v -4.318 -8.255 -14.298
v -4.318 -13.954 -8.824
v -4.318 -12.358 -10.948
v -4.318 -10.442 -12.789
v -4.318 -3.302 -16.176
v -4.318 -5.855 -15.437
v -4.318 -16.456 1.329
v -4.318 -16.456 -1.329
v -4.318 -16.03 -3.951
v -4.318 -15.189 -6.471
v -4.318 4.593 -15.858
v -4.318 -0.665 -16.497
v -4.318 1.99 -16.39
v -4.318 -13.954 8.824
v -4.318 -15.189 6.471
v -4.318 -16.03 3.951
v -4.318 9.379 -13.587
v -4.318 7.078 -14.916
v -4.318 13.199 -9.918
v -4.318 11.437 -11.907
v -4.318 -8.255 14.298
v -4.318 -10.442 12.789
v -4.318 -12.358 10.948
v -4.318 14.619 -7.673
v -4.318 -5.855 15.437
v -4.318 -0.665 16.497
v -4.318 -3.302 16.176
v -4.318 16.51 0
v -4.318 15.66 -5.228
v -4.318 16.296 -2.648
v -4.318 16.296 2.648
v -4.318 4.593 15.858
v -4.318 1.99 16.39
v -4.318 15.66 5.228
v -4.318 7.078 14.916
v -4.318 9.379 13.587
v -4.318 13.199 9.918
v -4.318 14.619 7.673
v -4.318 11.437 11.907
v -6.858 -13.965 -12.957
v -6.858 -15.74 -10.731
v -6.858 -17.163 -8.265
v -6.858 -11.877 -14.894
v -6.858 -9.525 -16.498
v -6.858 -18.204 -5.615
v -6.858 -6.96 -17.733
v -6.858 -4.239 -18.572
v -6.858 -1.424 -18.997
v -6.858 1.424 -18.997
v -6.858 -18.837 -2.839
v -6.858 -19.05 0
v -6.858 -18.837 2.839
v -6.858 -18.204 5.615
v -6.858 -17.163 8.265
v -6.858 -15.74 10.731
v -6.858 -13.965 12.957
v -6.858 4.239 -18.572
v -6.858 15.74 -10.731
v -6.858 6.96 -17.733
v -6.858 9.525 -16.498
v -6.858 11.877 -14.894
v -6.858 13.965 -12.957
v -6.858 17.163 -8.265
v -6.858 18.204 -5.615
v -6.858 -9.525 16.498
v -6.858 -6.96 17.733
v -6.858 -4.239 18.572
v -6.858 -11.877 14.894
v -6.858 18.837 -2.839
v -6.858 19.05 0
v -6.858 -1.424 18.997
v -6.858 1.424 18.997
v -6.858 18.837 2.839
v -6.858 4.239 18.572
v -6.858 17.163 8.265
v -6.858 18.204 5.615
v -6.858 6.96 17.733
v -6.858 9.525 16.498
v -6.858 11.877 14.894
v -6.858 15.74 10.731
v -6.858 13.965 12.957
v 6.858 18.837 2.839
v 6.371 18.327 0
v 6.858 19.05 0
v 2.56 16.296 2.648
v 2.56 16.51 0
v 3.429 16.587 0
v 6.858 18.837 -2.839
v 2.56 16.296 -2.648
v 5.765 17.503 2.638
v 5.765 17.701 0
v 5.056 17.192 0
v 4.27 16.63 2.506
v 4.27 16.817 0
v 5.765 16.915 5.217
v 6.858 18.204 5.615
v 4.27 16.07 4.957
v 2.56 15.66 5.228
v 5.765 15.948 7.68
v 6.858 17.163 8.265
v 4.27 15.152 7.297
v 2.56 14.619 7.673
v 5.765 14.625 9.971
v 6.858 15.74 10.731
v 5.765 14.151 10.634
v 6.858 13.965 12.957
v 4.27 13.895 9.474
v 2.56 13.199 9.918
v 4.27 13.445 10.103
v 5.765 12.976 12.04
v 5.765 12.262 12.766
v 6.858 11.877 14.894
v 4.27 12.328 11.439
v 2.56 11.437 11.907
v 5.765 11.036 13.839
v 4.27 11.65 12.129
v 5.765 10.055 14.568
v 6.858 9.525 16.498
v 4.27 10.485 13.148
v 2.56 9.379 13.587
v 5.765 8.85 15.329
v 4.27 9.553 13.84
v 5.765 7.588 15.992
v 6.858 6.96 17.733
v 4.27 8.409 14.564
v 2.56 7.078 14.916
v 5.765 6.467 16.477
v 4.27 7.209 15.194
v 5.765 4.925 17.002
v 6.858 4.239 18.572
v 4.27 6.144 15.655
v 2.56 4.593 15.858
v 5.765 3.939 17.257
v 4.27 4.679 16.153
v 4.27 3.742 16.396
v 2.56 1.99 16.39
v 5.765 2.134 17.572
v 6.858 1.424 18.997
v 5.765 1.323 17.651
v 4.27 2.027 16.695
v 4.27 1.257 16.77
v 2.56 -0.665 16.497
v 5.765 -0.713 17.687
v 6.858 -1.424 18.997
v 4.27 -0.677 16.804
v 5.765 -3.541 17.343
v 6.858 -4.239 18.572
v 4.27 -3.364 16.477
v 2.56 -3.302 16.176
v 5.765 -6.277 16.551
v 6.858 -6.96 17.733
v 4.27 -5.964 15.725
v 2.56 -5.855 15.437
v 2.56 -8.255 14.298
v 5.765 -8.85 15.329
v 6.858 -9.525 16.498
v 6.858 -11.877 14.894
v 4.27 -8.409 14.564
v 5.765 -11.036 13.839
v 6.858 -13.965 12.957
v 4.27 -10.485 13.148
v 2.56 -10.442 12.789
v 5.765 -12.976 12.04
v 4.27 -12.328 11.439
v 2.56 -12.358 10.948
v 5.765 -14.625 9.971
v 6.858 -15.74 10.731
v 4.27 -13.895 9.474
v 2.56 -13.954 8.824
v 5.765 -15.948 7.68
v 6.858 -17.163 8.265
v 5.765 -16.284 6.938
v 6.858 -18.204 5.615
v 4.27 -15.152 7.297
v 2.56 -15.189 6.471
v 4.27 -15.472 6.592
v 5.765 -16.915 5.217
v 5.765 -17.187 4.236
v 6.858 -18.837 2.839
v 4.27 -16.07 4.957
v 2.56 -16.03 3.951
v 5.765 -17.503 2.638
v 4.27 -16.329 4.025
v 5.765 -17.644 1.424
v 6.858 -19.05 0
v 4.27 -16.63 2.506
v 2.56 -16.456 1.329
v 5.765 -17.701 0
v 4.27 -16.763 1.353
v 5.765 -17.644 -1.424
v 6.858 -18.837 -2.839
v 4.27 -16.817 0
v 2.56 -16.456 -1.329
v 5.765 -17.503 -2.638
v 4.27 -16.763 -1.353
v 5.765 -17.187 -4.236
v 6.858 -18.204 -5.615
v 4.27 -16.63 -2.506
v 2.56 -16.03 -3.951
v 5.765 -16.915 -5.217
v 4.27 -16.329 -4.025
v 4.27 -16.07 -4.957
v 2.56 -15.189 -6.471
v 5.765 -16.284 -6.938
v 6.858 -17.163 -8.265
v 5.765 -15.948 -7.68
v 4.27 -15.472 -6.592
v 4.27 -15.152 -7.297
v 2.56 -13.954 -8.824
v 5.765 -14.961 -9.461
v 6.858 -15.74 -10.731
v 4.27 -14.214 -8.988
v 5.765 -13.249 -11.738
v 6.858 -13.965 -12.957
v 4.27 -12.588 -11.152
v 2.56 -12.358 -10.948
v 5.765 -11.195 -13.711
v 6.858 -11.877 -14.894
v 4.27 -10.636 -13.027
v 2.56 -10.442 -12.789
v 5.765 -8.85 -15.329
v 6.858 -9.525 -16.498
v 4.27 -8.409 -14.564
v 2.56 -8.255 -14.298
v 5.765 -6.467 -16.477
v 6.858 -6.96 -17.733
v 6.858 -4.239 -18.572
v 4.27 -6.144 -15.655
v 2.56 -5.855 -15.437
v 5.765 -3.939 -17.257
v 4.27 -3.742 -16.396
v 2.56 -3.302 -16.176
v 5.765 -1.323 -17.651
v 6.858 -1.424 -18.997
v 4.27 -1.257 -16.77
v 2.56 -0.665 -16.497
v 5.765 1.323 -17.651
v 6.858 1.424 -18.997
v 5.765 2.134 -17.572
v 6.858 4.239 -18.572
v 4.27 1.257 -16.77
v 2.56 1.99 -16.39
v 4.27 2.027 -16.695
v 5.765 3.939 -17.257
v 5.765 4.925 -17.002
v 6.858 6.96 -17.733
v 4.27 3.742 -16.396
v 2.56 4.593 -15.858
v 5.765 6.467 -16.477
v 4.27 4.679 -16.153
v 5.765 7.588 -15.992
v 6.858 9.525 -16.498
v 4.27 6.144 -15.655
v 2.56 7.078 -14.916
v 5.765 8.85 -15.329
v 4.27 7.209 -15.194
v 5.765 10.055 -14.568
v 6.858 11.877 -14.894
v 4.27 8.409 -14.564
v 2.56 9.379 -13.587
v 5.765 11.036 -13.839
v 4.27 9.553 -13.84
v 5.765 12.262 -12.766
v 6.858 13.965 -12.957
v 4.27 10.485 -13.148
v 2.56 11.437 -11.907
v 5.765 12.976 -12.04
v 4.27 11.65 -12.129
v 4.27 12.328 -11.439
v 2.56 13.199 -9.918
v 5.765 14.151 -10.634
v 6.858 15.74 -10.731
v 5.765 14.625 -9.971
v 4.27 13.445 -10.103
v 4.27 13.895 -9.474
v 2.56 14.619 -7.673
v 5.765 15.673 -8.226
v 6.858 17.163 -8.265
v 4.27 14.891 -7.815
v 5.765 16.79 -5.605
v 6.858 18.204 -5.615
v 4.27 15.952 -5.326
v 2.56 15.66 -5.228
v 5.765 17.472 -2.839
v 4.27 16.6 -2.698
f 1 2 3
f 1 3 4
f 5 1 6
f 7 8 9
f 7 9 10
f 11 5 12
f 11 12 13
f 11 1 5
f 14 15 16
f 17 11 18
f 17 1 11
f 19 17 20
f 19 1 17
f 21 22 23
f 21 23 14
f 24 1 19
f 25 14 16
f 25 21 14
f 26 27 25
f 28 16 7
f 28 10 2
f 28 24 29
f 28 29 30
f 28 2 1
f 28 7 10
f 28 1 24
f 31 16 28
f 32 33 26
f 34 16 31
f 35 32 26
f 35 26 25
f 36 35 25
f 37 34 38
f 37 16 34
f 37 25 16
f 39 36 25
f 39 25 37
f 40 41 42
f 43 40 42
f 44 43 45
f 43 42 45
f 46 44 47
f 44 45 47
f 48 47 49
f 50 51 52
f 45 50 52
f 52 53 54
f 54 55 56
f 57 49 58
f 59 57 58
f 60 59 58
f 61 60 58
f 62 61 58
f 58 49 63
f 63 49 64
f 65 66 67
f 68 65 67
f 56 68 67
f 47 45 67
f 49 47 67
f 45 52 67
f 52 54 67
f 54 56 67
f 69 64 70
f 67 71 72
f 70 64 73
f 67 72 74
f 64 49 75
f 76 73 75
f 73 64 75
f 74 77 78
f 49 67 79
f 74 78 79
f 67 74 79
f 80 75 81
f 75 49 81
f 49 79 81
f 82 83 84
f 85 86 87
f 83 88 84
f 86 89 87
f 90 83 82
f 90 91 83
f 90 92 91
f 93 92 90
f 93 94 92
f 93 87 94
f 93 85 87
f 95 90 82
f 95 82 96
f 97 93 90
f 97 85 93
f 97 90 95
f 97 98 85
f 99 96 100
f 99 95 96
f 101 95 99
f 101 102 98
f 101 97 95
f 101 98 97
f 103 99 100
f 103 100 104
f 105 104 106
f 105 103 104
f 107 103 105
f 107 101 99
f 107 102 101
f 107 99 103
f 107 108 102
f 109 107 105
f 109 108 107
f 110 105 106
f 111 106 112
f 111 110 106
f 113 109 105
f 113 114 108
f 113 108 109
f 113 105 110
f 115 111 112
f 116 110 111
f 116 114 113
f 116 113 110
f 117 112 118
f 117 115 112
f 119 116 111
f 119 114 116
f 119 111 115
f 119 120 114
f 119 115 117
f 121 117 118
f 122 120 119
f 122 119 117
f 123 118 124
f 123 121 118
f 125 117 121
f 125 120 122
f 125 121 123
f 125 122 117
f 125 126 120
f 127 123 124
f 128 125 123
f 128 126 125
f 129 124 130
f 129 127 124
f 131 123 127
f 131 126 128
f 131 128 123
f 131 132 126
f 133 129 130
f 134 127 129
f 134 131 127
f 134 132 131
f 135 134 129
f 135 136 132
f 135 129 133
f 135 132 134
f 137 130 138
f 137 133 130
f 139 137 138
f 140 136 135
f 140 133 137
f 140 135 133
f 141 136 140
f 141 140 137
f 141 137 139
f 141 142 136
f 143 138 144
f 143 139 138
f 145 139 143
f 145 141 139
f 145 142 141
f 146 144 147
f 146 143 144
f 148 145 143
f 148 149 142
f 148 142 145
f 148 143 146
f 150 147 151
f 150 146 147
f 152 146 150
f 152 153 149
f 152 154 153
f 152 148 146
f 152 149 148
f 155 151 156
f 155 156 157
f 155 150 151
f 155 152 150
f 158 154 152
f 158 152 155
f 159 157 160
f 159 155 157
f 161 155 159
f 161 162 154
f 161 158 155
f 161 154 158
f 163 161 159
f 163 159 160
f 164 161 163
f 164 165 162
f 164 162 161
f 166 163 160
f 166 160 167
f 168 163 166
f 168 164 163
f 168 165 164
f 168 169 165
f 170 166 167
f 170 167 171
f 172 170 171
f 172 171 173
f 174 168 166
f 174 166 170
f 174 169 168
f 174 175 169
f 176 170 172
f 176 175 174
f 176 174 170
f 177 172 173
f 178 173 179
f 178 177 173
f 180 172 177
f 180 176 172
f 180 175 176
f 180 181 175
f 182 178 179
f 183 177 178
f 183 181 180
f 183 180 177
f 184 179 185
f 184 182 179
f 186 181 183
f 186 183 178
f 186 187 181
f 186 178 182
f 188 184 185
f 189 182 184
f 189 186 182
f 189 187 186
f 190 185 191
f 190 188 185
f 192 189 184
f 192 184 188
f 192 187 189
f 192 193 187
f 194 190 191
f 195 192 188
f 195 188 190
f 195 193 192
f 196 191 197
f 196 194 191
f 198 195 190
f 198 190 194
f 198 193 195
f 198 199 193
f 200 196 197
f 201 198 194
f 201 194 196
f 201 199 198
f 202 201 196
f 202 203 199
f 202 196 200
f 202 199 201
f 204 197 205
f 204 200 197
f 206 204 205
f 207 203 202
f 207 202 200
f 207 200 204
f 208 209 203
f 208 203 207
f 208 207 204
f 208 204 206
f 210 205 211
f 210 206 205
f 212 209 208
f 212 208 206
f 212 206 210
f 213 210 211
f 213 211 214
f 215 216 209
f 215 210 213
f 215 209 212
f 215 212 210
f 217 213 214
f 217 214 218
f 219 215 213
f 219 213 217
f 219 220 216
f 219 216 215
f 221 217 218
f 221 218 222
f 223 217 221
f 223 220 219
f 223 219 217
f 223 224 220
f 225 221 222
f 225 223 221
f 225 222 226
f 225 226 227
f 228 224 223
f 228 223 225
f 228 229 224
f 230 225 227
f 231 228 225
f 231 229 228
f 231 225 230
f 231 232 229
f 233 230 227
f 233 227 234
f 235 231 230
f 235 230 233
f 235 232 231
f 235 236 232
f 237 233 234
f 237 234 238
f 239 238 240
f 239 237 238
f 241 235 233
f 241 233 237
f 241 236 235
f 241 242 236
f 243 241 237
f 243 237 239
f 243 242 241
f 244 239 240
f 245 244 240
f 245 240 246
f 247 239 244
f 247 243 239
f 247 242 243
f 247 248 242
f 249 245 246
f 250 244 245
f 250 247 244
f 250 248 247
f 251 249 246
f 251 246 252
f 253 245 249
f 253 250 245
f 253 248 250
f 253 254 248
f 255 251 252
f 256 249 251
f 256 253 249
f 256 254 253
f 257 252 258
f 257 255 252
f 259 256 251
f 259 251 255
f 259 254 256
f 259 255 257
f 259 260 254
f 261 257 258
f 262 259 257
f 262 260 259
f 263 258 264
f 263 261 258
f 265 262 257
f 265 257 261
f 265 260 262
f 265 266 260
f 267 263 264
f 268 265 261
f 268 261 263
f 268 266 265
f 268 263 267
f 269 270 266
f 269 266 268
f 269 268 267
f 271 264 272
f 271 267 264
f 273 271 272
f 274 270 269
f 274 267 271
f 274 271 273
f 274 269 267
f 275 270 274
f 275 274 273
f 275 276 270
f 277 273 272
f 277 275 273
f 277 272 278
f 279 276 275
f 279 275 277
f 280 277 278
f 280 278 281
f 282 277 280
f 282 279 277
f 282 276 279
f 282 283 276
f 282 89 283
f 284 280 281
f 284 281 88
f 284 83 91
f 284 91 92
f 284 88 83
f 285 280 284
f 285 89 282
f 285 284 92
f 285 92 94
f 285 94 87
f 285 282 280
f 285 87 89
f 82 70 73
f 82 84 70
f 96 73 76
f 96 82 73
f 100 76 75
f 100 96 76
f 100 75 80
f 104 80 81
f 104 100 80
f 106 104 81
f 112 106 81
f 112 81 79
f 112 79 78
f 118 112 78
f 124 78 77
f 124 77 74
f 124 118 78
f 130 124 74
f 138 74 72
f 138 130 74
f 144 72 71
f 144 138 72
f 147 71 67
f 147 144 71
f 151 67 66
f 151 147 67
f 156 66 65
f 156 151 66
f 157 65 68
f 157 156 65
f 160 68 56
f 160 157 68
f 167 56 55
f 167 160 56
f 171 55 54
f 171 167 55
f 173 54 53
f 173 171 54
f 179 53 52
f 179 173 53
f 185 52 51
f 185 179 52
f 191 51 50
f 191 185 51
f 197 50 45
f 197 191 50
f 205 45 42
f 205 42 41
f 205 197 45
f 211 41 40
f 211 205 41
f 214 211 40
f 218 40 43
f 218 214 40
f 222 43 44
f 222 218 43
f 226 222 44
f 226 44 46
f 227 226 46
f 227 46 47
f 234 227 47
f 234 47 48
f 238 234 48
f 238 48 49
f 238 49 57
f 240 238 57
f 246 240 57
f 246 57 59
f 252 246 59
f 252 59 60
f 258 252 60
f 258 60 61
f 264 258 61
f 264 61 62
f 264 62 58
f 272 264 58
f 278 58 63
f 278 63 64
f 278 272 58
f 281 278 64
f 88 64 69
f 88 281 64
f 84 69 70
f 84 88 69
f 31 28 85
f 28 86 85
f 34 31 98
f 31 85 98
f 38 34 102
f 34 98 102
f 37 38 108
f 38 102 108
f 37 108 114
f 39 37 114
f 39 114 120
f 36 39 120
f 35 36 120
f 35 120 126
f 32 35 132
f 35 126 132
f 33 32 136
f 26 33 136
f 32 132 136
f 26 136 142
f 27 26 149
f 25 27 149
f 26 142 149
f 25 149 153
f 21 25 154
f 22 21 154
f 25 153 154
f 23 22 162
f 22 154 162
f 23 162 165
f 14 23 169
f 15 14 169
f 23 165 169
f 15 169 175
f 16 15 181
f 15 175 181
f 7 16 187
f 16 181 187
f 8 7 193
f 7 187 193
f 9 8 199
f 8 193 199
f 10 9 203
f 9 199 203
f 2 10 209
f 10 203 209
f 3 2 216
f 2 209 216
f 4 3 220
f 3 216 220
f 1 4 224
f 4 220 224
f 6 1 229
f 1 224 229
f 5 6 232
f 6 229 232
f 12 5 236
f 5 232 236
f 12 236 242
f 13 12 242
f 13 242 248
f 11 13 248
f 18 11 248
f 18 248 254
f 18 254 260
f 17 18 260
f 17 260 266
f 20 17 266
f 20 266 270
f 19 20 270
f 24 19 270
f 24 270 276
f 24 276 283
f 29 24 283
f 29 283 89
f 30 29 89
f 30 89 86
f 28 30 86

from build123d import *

# Parameters (mm, degrees)
F0_R     = 19.05
F0_R_2   = 12.7
F0_R_3   = 6.35
F1_DEPTH = 6.858
F2_T     = -2.54


# Not quite as in the source:
# - a fillet or chamfer that OpenCascade refuses, or shapes differently, is made with other operations: its cross-section is extruded or revolved along the edge and cut away or added
# - the program builds the solid bodies; features that only make, move or delete a surface that nothing else refers to are left out


with BuildPart() as f1:
    # F0 (on Right) → F1 (new body, symmetric)
    with BuildSketch(Plane.YZ):
        Circle(F0_R)
        Circle(F0_R_2, mode=Mode.SUBTRACT)
        Circle(F0_R_2)
        Circle(F0_R_3, mode=Mode.SUBTRACT)
        Circle(F0_R_3)
    extrude(amount=F1_DEPTH, both=True)

    # F2
    f2_openings = [f1.faces().sort_by_distance(p)[0] for p in [
        (6.858, 0, 0),
    ]]
    offset(amount=F2_T, openings=f2_openings)

    # F4: fillet of radius 4.9056819587 on 1 edges, made by hand

    # F4_s1 → F4_t2 (revolve, cut)
    with BuildSketch(Plane.XY):
        with BuildLine():
            ThreePointArc((6.858, 19.05), (5.0564518797, 17.1924723508), (2.5604117984, 16.51))
            Line((2.5604117984, 16.51), (6.858, 16.51))
            Line((6.858, 16.51), (6.858, 19.05))
        make_face()
    revolve(axis=Axis((6.858, 0, 0), (1, 0, 0)), mode=Mode.SUBTRACT)


solid = f1.part
